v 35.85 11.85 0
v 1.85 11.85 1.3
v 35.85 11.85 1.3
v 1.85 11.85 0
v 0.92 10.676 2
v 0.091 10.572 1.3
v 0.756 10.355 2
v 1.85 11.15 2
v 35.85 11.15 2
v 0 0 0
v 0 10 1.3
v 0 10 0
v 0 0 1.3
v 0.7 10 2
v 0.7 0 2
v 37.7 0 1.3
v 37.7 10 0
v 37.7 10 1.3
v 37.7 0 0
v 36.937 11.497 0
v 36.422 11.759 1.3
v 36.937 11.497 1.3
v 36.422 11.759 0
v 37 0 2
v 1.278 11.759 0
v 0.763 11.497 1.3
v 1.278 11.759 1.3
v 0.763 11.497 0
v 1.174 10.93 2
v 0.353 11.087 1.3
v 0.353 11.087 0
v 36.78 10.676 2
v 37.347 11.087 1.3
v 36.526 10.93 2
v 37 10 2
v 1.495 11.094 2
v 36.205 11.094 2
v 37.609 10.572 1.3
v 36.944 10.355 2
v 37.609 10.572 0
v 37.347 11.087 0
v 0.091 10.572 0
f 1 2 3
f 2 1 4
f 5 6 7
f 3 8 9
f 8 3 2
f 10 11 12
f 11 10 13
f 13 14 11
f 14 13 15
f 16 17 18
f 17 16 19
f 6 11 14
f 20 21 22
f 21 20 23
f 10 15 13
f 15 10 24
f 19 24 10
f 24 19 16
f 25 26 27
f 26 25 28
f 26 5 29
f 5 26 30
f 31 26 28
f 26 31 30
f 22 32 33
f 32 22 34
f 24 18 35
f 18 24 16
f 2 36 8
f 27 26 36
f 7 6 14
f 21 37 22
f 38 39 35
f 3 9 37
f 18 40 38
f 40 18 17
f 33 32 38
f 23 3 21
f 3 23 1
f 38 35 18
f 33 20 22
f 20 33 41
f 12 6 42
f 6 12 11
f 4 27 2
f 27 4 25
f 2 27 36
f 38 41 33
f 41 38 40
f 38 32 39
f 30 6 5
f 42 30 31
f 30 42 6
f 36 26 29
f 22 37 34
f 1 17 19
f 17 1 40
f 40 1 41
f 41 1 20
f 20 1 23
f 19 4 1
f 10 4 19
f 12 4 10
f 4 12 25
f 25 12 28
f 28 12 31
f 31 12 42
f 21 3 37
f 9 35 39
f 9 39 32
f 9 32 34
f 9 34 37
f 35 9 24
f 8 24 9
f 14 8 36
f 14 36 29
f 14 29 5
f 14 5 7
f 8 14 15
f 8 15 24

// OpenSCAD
$fn= 20;

text = "M0x0";

translate([37.7/2,(10+1.85)/2,0.2]) {
  rotate([0,180,0]) {
    linear_extrude(0.2)
    text(text, size=8, halign = "center", valign = "center");
  }
}

difference() {
  hull() {
    cube([37.7,10,1.3]);

    translate([0.7,0,1.3]) {
      cube([37.7-1.4,10,0.7]);
    }

    translate([1.85,10,0]) {
      cylinder(1.3, 1.85, 1.85);
    }
    translate([37.7-1.85,10,0]) {
      cylinder(1.3, 1.85, 1.85);
    }

    translate([1.85,10,1.3]) {
      cylinder(0.7, 1.85, 1.15);
    }
    translate([37.7-1.85,10,1.3]) {
      cylinder(0.7, 1.85, 1.15);
    }
  }


  translate([37.7/2,(10+1.85)/2,0.2]) {
    rotate([0,180,0]) {
      linear_extrude(1)
      text(text, size=8, halign = "center", valign = "center");
    }
  }
}
